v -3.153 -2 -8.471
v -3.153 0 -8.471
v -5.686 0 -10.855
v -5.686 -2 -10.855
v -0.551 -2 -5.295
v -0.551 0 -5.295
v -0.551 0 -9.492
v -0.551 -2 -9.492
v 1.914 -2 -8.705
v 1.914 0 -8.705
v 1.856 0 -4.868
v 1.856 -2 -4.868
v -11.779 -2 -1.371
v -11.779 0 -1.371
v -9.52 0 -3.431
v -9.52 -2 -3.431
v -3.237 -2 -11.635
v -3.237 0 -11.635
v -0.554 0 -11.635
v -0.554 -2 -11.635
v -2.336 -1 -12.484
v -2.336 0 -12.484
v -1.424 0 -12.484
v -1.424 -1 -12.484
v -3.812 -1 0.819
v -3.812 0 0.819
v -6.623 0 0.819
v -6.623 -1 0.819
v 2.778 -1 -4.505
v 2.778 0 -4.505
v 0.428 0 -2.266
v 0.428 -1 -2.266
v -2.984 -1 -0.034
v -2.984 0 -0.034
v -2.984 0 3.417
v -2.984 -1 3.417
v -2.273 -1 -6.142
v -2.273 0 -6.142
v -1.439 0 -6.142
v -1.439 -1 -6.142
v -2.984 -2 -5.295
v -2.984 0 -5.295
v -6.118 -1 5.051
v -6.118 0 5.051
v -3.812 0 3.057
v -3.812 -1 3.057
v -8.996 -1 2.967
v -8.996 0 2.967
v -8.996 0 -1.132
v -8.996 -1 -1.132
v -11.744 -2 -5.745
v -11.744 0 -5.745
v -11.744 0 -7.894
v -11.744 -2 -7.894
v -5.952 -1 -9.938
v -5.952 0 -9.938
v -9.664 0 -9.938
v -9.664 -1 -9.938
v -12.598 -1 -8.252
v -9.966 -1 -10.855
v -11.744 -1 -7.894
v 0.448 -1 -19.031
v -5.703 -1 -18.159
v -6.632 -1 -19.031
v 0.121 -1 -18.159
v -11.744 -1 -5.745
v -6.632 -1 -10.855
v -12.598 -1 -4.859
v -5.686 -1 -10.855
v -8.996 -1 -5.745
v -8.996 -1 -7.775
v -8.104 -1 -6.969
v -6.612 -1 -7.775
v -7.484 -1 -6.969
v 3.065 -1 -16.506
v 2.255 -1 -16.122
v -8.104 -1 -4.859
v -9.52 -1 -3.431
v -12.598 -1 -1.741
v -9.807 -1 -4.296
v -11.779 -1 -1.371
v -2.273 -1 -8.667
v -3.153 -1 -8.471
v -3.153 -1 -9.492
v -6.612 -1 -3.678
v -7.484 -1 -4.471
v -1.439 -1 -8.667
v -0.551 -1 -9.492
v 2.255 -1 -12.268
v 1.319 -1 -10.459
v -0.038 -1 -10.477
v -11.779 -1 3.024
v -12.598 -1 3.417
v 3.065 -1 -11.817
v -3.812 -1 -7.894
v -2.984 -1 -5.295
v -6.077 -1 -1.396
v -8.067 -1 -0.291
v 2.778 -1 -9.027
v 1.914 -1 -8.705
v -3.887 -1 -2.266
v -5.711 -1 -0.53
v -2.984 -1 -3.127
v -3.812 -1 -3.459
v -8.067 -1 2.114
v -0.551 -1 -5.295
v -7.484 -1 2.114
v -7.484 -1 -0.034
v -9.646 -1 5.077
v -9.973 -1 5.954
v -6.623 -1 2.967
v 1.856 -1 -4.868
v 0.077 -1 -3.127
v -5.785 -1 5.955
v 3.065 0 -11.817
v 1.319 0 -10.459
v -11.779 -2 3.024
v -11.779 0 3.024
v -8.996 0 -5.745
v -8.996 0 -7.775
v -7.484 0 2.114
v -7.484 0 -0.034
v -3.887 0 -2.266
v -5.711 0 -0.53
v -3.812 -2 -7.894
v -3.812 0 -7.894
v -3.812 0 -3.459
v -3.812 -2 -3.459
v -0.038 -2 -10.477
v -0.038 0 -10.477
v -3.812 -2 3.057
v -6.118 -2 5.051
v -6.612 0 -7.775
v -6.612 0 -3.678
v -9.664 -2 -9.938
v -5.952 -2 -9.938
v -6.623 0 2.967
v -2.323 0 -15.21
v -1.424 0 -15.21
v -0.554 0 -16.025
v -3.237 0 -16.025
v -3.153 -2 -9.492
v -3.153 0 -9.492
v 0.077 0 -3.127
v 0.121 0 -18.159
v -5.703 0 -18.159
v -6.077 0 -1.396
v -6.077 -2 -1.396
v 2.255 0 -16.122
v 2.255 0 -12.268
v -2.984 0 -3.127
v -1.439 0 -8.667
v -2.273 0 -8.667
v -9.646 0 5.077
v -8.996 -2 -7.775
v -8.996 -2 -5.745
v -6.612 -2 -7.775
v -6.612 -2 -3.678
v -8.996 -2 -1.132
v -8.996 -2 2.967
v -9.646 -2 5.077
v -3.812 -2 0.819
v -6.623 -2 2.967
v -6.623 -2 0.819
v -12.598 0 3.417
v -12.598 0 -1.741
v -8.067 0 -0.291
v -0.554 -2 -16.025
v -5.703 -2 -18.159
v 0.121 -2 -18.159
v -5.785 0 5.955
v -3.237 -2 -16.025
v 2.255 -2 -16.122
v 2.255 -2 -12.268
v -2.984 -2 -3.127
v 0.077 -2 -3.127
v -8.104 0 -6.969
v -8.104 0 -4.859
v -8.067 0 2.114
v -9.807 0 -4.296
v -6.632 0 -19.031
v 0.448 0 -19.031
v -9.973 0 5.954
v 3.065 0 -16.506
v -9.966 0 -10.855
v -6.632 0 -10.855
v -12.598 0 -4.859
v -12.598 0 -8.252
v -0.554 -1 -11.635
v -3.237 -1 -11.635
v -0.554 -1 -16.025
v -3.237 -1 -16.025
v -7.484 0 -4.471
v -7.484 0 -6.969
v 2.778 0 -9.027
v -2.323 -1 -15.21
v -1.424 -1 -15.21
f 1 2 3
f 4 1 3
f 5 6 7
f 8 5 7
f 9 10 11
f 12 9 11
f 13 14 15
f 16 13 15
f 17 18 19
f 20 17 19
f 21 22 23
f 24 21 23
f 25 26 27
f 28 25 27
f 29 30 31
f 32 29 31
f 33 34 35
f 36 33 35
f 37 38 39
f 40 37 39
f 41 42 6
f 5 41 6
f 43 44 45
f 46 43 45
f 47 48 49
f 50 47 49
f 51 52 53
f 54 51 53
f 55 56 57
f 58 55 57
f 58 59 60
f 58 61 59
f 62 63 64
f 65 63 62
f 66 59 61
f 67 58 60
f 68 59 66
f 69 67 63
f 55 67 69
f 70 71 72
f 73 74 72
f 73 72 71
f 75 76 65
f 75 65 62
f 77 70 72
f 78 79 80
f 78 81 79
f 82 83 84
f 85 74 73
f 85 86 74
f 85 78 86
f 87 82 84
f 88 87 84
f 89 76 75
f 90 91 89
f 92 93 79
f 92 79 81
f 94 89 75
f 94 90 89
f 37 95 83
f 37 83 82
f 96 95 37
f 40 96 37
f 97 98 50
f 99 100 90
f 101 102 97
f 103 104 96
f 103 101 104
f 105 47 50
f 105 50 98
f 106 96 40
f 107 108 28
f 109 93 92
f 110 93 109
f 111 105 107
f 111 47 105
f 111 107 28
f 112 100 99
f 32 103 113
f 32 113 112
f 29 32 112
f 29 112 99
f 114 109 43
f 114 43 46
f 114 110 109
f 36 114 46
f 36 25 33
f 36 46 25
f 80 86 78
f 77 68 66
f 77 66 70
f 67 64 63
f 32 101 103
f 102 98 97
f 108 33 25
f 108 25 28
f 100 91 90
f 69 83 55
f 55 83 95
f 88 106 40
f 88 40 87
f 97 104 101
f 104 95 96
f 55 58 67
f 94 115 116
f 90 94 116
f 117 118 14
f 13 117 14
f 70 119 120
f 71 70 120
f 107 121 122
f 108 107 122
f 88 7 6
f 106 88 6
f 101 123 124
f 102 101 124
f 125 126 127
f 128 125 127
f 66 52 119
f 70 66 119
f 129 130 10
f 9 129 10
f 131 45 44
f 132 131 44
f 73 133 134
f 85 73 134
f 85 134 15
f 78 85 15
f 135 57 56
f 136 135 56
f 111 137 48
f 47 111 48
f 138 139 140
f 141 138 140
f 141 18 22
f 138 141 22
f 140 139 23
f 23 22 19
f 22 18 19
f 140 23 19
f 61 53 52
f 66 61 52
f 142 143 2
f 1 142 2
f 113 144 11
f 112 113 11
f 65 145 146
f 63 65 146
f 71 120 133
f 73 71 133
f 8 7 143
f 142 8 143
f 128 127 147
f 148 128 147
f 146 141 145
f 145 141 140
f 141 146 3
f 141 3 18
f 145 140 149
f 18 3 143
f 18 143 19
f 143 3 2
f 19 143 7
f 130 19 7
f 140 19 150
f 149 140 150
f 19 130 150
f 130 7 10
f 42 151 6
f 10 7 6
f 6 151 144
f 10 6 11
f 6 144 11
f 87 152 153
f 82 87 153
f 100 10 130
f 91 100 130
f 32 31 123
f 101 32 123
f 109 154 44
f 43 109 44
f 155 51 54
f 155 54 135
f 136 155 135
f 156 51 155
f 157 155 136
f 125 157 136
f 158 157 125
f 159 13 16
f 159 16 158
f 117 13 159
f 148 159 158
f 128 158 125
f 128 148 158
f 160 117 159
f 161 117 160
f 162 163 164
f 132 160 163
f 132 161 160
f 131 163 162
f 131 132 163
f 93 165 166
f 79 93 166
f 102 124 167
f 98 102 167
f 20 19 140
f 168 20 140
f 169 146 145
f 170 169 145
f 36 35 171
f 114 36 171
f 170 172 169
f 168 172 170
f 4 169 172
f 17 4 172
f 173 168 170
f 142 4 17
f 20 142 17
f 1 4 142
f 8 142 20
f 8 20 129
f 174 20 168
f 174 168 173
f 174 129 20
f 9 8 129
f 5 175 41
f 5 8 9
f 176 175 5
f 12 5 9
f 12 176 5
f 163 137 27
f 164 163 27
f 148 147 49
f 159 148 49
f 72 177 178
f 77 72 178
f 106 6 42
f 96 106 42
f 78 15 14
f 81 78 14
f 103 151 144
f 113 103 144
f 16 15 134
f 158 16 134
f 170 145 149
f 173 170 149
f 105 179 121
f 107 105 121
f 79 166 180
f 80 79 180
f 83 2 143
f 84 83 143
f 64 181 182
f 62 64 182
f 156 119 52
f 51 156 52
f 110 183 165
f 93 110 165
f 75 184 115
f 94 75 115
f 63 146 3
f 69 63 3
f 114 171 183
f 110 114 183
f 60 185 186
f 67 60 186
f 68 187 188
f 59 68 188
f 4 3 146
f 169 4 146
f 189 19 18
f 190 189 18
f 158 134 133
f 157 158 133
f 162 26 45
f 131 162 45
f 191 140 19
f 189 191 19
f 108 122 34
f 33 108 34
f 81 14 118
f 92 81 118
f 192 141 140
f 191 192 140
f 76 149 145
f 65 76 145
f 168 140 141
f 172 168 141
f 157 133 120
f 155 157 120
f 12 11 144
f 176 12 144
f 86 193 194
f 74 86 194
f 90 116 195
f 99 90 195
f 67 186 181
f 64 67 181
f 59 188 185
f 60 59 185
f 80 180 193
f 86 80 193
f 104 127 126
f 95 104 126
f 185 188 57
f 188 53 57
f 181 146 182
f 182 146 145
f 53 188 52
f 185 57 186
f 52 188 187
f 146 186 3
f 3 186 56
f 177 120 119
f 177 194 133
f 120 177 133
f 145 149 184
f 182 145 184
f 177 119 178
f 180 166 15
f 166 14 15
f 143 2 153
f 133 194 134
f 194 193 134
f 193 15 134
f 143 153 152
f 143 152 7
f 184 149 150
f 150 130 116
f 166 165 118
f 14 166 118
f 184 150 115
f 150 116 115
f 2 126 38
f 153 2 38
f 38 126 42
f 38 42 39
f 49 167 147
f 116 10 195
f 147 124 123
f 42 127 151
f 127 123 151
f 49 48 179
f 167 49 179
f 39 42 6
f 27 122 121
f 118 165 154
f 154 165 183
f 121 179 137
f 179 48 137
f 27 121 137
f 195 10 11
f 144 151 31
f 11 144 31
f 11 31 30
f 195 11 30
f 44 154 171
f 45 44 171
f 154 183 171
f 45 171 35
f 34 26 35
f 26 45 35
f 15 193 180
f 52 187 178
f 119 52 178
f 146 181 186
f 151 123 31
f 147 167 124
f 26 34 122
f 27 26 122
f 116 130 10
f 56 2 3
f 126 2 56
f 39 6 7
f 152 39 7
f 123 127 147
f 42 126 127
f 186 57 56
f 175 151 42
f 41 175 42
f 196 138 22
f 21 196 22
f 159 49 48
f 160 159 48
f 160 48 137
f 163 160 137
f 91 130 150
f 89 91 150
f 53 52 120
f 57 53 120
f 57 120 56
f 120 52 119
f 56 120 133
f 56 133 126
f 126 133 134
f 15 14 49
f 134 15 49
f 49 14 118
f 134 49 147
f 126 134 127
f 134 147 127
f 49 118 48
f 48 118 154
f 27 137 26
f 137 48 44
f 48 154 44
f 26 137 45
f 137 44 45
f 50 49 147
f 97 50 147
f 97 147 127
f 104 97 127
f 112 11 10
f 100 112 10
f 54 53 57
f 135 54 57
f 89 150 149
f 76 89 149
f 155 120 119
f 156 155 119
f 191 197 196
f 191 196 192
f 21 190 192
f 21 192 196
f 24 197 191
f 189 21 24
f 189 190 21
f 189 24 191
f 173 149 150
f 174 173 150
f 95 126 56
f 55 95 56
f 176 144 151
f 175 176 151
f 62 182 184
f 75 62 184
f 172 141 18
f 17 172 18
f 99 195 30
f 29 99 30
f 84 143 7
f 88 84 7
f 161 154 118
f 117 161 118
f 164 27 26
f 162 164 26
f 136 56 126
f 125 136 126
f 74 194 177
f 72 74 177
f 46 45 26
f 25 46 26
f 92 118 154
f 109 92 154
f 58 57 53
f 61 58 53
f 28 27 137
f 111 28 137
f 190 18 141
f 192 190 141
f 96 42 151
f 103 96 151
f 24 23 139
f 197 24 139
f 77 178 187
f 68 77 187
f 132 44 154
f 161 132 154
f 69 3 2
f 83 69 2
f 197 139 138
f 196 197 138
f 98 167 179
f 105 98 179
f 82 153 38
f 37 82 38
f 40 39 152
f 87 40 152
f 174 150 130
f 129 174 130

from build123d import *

# Parameters (mm, degrees)
F1_DEPTH = 2
F2_DEPTH = 1


with BuildPart() as f1:
    # F0 (on Front) → F1 (new body)
    with BuildSketch(Plane.XZ):
        Polygon((-6.117652, 5.050753), (-9.646244, 5.076819), (-11.778664, 3.0235), (-11.778664, -1.370539), (-9.52022, -3.430721), (-6.611727, -3.677757), (-6.611727, -7.77537), (-8.995513, -7.77537), (-8.995513, -5.745122), (-11.744258, -5.745122), (-11.744258, -7.894021), (-9.663685, -9.937631), (-5.951959, -9.937631), (-3.811935, -7.894021), (-3.811935, -3.459109), (-6.077381, -1.396149), (-8.995513, -1.132481), (-8.995513, 2.967111), (-6.623297, 2.967111), (-6.623297, 0.819248), (-3.811935, 0.819248), (-3.811935, 3.056561), align=None)
        Polygon((0.076645, -3.126698), (-2.983604, -3.126698), (-2.983604, -5.294547), (-0.551261, -5.294547), (-0.551261, -9.491613), (-3.153238, -9.491613), (-3.153238, -8.471345), (-5.685775, -10.854829), (-5.703424, -18.159136), (0.120658, -18.159136), (2.255432, -16.122171), (2.255432, -12.268207), (-0.038249, -10.476676), (1.913641, -8.705081), (1.856365, -4.867615), align=None)
        Polygon((-3.236875, -11.634663), (-3.197325, -11.634663), (-3.188428, -11.634663), (-0.554047, -11.634663), (-0.554047, -16.024745), (-3.236875, -16.024745), align=None, mode=Mode.SUBTRACT)
    extrude(amount=F1_DEPTH)


with BuildPart() as f2:
    # F0 (on Front) → F2 (new body)
    with BuildSketch(Plane.XZ):
        Polygon((-5.78489, 5.954892), (-9.973321, 5.953955), (-12.597663, 3.417479), (-12.597663, -1.740527), (-9.80701, -4.296013), (-7.484483, -4.470576), (-7.484483, -6.968836), (-8.104104, -6.968836), (-8.104104, -4.859487), (-12.597663, -4.859487), (-12.597663, -8.25231), (-9.965823, -10.854829), (-6.631813, -10.854829), (-5.685775, -10.854829), (-3.153238, -8.471345), (-2.983604, -8.311696), (-2.983604, -5.294547), (-2.983604, -3.126698), (-3.887176, -2.266324), (-5.710893, -0.529796), (-8.067321, -0.290748), (-8.067321, 2.114216), (-7.484483, 2.114216), (-7.484483, -0.033646), (-2.983604, -0.033646), (-2.983604, 3.417479), align=None)
        Polygon((-11.778664, 3.0235), (-9.646244, 5.076819), (-6.117652, 5.050753), (-3.811935, 3.056561), (-3.811935, 0.819248), (-6.623297, 0.819248), (-6.623297, 2.967111), (-8.995513, 2.967111), (-8.995513, -1.132481), (-6.077381, -1.396149), (-3.811935, -3.459109), (-3.811935, -7.894021), (-5.951959, -9.937631), (-9.663685, -9.937631), (-11.744258, -7.894021), (-11.744258, -5.745122), (-8.995513, -5.745122), (-8.995513, -7.77537), (-6.611727, -7.77537), (-6.611727, -3.677757), (-9.52022, -3.430721), (-11.778664, -1.370539), align=None, mode=Mode.SUBTRACT)
        Polygon((-0.551261, -5.294547), (-2.983604, -5.294547), (-2.983604, -8.311696), (-3.153238, -8.471345), (-3.153238, -9.491613), (-0.551261, -9.491613), align=None)
        Polygon((-2.272869, -8.667158), (-2.272869, -6.141966), (-1.438961, -6.142495), (-1.438961, -8.667158), align=None, mode=Mode.SUBTRACT)
        Polygon((-3.188428, -11.634663), (-3.197325, -11.634663), (-3.236875, -11.634663), (-3.236875, -16.024745), (-0.554047, -16.024745), (-0.554047, -11.634663), align=None)
        Polygon((-2.323147, -15.210209), (-2.335513, -12.483668), (-1.424239, -12.483668), (-1.424239, -15.210209), align=None, mode=Mode.SUBTRACT)
        Polygon((0.42769, -2.266324), (-3.887176, -2.266324), (-2.983604, -3.126698), (0.076645, -3.126698), (1.856365, -4.867615), (1.913641, -8.705081), (-0.038249, -10.476676), (2.255432, -12.268207), (2.255432, -16.122171), (0.120658, -18.159136), (-5.703424, -18.159136), (-5.685775, -10.854829), (-6.631813, -10.854829), (-6.631813, -19.030758), (0.447521, -19.030758), (3.065368, -16.505952), (3.065368, -11.8168), (1.318564, -10.458906), (2.778358, -9.026719), (2.778358, -4.504611), align=None)
    extrude(amount=F2_DEPTH)


solid = Compound([f1.part, f2.part])
